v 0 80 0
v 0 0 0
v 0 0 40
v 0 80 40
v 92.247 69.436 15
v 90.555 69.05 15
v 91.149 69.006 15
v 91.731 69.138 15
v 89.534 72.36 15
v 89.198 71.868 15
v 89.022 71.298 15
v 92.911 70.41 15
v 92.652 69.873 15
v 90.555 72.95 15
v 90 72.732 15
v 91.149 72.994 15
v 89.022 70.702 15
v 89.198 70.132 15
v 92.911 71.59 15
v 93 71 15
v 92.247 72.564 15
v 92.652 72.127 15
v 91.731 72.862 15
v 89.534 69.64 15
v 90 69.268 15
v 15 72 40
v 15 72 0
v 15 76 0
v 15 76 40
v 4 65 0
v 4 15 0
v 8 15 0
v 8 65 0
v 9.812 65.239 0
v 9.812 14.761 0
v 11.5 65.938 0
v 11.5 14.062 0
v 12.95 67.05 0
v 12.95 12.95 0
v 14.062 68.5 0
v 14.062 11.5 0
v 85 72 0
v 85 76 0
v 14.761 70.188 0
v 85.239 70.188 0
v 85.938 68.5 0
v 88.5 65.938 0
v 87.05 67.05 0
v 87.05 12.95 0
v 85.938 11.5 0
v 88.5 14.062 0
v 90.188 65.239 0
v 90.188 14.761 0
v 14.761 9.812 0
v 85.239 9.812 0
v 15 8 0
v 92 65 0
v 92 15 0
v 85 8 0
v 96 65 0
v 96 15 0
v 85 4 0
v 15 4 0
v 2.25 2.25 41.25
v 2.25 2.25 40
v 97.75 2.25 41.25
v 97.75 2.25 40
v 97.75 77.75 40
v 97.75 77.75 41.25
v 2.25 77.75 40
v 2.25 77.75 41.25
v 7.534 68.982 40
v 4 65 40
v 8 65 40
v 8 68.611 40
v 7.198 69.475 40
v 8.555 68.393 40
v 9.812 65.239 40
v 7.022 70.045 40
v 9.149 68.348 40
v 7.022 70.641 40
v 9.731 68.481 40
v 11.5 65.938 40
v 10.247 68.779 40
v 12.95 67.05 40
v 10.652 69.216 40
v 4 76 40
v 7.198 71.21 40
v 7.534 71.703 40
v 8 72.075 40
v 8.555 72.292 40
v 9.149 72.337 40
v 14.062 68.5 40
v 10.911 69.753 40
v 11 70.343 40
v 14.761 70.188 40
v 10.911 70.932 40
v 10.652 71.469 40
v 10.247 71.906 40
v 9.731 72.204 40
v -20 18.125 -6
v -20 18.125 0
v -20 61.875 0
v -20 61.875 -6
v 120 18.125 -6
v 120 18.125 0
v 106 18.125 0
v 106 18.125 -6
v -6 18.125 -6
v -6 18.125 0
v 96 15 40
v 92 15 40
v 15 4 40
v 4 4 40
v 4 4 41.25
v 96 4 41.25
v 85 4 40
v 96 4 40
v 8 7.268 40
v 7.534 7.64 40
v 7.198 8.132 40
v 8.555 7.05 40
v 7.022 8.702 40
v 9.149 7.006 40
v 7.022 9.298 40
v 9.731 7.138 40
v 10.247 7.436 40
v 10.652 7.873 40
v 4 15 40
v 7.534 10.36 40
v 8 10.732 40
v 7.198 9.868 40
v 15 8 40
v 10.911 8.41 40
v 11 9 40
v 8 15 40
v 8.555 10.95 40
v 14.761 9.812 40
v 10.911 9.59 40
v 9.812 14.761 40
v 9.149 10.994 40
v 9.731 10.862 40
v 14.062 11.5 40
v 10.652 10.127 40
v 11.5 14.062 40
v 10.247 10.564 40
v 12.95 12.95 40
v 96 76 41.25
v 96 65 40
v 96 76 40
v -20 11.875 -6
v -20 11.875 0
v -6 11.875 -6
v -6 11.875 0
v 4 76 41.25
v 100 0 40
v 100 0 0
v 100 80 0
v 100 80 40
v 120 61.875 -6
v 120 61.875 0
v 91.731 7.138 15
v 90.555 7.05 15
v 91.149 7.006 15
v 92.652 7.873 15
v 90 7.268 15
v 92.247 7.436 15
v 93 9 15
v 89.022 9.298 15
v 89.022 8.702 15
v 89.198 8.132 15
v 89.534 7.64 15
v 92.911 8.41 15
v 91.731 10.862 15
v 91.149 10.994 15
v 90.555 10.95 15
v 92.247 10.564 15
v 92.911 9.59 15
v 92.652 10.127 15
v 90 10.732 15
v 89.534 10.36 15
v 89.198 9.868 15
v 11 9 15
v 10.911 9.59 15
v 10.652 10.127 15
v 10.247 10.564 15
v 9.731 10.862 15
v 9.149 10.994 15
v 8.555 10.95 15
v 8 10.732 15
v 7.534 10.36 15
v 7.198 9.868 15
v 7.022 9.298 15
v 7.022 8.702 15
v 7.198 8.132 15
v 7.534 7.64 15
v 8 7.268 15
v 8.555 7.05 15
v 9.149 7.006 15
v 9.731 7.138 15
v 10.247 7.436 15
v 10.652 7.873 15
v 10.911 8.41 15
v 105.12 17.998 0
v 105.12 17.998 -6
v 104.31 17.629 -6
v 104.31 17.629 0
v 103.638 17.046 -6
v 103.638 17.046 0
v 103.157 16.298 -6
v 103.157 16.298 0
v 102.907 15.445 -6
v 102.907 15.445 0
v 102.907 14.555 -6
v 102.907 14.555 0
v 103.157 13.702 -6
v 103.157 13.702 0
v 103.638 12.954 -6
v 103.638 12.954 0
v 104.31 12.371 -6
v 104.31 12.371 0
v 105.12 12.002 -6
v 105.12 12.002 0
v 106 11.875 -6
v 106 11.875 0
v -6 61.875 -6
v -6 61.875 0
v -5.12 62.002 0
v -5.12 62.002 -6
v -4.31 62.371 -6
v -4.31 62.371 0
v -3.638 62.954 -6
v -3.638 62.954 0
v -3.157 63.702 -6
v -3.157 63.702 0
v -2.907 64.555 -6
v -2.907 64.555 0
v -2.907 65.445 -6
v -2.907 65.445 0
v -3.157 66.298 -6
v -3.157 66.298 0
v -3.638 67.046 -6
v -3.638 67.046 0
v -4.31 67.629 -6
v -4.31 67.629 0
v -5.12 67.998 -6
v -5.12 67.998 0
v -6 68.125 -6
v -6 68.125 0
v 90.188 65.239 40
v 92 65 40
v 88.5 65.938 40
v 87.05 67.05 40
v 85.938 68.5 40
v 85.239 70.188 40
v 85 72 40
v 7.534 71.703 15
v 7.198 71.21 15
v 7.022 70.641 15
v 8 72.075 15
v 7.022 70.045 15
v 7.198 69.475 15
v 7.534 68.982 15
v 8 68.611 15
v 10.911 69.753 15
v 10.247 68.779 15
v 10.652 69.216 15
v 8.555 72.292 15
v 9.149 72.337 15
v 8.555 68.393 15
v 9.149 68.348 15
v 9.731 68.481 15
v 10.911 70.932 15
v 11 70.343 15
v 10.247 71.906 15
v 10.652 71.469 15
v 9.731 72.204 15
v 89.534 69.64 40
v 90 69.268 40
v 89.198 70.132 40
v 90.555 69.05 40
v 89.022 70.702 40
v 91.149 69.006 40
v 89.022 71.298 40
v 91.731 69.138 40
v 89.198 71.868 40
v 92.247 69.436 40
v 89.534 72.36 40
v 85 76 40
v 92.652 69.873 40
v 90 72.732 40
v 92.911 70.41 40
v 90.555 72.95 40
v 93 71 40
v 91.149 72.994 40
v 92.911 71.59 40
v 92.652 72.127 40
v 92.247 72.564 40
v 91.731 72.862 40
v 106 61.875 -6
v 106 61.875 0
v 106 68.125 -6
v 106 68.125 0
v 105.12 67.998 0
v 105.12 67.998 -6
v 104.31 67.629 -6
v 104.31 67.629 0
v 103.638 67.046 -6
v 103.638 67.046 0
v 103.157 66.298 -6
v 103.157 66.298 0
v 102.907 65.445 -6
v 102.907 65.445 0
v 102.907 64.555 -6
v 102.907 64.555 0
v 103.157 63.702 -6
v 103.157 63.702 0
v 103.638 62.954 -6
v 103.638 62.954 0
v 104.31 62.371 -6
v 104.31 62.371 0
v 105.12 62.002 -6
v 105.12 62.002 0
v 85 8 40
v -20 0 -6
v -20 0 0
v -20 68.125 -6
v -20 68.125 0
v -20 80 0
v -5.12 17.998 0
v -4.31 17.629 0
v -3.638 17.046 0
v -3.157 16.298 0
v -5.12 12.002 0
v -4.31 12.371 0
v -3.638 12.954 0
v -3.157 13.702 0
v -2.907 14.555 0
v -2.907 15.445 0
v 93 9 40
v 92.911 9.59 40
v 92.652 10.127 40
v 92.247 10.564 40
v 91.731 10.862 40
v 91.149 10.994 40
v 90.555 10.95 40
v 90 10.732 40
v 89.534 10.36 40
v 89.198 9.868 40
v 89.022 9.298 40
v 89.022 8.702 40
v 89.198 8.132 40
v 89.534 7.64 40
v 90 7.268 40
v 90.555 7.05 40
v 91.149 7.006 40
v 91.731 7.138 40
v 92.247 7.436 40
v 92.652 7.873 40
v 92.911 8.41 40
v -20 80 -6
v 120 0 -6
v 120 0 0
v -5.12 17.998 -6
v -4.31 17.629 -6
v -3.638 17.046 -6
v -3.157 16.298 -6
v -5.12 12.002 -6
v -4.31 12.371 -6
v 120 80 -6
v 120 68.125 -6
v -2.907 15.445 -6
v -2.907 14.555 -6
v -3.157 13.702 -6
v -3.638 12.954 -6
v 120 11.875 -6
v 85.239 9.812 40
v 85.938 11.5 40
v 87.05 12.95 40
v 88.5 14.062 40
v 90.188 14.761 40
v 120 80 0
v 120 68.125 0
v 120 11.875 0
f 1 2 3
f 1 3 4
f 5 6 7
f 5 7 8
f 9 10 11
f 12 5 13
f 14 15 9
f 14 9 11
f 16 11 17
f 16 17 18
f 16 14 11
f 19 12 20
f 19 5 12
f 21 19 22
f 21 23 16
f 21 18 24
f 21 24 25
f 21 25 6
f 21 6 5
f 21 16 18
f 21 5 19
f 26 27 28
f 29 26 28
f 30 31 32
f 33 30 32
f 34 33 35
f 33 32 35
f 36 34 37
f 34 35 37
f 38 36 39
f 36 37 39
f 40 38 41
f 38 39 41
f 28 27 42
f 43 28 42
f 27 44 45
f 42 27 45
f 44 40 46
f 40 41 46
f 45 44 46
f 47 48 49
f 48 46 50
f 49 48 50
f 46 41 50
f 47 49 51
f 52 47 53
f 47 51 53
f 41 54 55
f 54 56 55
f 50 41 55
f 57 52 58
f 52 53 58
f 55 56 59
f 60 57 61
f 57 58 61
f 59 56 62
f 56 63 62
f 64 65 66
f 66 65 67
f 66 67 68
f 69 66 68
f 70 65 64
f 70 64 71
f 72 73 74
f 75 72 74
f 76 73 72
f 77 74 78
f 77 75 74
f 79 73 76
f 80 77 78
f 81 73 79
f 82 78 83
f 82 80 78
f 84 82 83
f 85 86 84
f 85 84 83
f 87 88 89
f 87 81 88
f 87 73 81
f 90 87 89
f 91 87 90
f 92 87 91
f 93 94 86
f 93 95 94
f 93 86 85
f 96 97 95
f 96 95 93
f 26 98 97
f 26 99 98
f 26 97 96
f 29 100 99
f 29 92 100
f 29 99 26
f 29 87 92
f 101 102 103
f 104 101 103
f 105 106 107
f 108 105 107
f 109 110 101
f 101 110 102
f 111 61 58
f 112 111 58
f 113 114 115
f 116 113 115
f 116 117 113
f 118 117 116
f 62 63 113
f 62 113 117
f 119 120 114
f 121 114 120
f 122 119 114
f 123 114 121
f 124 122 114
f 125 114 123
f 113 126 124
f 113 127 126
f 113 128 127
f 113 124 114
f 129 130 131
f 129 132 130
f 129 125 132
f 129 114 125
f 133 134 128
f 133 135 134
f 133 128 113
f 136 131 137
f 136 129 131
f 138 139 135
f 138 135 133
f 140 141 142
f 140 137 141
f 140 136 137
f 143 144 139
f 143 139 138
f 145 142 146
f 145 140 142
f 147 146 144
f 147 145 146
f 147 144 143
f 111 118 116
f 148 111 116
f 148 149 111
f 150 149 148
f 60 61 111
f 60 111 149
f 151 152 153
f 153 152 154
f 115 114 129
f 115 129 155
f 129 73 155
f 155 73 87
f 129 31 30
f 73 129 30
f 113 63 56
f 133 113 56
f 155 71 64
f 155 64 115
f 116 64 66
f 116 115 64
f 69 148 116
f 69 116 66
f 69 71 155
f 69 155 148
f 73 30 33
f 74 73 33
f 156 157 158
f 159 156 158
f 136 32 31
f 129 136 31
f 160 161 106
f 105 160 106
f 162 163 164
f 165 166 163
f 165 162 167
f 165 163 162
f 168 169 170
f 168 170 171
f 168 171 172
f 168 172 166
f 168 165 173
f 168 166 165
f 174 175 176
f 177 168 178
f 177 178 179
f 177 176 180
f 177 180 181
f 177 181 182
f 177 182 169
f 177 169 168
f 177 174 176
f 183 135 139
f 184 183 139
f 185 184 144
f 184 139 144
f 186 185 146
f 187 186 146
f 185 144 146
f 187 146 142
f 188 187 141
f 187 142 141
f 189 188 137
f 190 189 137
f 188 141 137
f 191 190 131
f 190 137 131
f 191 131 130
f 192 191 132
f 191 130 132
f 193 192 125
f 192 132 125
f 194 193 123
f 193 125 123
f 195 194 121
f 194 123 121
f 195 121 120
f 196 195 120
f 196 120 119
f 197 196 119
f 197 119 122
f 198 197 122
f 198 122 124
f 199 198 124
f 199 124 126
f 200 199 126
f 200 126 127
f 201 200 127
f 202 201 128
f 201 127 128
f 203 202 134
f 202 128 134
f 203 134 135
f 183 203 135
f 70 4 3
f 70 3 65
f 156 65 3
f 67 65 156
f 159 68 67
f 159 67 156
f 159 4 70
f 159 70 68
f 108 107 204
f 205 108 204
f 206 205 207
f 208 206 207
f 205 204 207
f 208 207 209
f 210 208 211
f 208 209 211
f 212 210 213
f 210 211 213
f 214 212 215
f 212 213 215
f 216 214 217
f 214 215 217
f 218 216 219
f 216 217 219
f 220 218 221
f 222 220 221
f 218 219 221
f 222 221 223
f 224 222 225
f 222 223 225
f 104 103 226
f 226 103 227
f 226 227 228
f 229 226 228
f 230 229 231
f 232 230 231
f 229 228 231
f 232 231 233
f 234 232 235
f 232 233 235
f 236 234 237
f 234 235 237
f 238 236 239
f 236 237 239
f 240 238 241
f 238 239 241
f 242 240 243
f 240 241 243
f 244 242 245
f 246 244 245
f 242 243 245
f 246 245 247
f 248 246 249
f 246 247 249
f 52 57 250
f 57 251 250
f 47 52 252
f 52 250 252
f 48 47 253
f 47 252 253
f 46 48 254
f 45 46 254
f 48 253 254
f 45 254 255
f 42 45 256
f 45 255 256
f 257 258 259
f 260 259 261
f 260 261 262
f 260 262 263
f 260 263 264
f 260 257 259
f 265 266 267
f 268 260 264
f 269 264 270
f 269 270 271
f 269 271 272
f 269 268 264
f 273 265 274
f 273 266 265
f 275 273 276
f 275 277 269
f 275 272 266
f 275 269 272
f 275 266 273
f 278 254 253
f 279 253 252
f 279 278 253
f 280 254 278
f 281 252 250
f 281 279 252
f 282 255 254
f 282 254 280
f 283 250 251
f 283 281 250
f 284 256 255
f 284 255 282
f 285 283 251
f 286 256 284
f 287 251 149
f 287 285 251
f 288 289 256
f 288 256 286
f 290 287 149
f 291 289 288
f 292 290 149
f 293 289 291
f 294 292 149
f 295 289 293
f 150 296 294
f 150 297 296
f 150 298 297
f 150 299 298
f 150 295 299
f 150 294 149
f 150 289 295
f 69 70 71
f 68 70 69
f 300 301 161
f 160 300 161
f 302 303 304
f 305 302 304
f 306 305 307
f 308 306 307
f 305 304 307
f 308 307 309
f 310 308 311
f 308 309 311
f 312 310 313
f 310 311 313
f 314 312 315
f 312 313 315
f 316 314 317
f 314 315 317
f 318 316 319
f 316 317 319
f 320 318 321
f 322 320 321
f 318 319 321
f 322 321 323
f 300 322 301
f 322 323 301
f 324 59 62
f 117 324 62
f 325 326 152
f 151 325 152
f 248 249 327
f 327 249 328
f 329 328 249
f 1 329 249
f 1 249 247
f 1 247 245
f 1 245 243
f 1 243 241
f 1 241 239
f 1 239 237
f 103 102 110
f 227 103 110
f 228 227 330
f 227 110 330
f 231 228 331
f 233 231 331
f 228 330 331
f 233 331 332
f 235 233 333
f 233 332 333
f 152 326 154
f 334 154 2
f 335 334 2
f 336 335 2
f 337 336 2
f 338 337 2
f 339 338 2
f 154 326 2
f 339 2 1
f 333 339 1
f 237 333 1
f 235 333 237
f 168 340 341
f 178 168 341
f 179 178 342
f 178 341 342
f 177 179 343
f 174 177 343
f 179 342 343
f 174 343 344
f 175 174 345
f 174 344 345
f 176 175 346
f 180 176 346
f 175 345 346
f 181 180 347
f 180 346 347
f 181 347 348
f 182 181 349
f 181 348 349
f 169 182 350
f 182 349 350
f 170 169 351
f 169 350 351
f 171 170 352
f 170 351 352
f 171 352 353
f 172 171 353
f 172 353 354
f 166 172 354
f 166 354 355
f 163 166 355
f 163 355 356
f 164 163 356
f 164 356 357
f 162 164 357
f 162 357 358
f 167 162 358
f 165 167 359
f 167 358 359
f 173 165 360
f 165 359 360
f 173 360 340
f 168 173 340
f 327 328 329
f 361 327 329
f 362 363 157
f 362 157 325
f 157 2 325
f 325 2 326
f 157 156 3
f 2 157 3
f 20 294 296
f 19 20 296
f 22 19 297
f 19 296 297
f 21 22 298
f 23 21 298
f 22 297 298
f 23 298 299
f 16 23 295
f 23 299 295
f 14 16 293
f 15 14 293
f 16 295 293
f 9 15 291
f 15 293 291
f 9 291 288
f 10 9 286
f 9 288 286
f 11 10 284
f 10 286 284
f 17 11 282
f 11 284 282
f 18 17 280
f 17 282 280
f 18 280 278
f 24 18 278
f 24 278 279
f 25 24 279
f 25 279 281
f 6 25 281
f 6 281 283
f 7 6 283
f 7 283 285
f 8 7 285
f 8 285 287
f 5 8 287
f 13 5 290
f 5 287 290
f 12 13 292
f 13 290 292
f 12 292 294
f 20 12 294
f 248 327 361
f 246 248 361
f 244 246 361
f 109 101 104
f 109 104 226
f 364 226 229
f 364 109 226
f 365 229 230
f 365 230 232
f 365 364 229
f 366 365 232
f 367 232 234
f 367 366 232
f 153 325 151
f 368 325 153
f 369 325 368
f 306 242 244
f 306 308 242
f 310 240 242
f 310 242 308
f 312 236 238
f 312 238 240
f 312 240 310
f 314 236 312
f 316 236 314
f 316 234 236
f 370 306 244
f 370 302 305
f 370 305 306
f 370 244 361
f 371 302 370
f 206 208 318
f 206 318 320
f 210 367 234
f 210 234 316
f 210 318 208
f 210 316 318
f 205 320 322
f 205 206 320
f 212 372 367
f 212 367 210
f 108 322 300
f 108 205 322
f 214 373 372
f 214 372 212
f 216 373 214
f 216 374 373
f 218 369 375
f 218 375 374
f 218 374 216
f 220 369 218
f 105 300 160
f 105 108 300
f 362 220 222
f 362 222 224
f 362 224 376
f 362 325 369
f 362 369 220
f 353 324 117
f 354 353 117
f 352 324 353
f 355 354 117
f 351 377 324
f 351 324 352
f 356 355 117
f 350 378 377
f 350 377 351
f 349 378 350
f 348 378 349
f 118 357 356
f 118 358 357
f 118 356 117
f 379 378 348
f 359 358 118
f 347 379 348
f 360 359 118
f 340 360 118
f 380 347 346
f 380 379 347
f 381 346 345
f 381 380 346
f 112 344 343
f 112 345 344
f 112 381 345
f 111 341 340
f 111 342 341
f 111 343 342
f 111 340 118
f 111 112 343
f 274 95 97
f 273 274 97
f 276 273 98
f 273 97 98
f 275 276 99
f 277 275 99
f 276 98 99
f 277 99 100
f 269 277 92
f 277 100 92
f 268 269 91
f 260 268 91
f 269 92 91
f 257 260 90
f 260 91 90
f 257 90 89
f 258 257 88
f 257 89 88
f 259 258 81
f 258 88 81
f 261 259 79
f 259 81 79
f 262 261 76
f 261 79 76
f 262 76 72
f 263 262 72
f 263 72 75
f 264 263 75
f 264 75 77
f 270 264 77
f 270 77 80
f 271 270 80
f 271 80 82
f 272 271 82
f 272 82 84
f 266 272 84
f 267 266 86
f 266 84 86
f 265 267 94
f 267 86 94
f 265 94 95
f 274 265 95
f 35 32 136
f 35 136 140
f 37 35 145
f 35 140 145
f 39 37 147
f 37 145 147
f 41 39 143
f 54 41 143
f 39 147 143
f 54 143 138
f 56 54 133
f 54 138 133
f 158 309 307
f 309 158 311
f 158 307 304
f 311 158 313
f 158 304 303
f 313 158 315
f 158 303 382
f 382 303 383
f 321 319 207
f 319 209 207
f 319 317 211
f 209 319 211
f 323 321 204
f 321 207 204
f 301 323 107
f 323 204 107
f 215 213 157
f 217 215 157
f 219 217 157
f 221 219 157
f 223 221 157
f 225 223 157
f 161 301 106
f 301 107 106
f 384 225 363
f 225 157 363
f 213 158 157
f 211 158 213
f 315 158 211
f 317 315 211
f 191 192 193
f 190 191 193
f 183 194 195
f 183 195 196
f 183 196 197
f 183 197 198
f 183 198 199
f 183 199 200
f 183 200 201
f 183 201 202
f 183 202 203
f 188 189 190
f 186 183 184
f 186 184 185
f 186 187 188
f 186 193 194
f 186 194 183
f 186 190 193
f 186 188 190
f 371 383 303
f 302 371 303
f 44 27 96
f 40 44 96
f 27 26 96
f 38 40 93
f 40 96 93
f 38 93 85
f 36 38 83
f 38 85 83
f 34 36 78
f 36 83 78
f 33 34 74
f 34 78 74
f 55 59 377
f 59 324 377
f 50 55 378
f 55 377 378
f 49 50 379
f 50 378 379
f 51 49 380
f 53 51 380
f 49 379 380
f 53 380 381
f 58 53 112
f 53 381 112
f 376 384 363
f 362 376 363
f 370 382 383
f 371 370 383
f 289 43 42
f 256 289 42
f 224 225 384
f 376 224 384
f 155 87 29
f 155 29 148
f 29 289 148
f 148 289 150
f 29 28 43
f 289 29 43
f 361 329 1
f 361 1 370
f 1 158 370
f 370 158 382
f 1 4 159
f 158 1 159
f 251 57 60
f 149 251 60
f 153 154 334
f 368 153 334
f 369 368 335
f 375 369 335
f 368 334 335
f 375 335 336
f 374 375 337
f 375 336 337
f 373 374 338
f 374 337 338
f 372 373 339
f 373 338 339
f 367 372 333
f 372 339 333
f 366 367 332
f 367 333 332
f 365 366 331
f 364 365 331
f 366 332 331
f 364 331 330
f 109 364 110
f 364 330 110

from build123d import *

# Parameters (mm, degrees)
F0_W     = 100
F0_H     = 80
F1_DEPTH = 40
F3_DEPTH = 6
F4_R     = 7
F5_W     = 95.5
F5_H     = 75.5
F5_W_2   = 92
F5_H_2   = 72
F6_DEPTH = 1.25
F7_R     = 2
F8_DEPTH = 25


with BuildPart() as f1:
    # F0 (on Top) → F1 (new body)
    with BuildSketch(Plane.XY):
        with Locations((50, 40)):
            Rectangle(F0_W, F0_H)
        Polygon((85, 4), (15, 4), (15, 15), (4, 15), (4, 65), (15, 65), (15, 76), (85, 76), (85, 65), (96, 65), (96, 15), (85, 15), align=None, mode=Mode.SUBTRACT)
    extrude(amount=F1_DEPTH)

    # F2 (on face) → F3 (join)
    with BuildSketch(Plane(origin=(0, 0, 0), x_dir=(1, 0, 0), z_dir=(0, 0, -1))):
        with BuildLine():
            Line((120, 0), (-20, 0))
            Line((-20, 0), (-20, -11.875))
            Line((-20, -11.875), (-6, -11.875))
            ThreePointArc((-6, -11.875), (-2.875, -15), (-6, -18.125))
            Line((-6, -18.125), (-20, -18.125))
            Line((-20, -18.125), (-20, -61.875))
            Line((-20, -61.875), (-6, -61.875))
            ThreePointArc((-6, -61.875), (-2.875, -65), (-6, -68.125))
            Line((-6, -68.125), (-20, -68.125))
            Line((-20, -68.125), (-20, -80))
            Line((-20, -80), (120, -80))
            Line((120, -80), (120, -68.125))
            Line((120, -68.125), (106, -68.125))
            ThreePointArc((106, -68.125), (102.875, -65), (106, -61.875))
            Line((106, -61.875), (120, -61.875))
            Line((120, -61.875), (120, -18.125))
            Line((120, -18.125), (106, -18.125))
            ThreePointArc((106, -18.125), (102.875, -15), (106, -11.875))
            Line((106, -11.875), (120, -11.875))
            Line((120, -11.875), (120, 0))
        make_face()
    extrude(amount=F3_DEPTH)

    # F4
    f4_edges = [f1.edges().sort_by_distance(p)[0] for p in [
        (15, 65, 20),
        (15, 15, 20),
        (85, 65, 20),
        (85, 15, 20),
    ]]
    fillet(f4_edges, radius=F4_R)

    # F5 (on face) → F6 (join)
    with BuildSketch(Plane.XY.offset(40)):
        with Locations((50, 40)):
            Rectangle(F5_W, F5_H)
        with Locations((50, 40)):
            Rectangle(F5_W_2, F5_H_2, mode=Mode.SUBTRACT)
    extrude(amount=F6_DEPTH)

    # F7 (on face) → F8 (cut)
    with BuildSketch(Plane.XY.offset(40)):
        with Locations((9, 9)):
            Circle(F7_R)
        with Locations((9, 70.342632)):
            Circle(F7_R)
        with Locations((91, 71)):
            Circle(F7_R)
        with Locations((91, 9)):
            Circle(F7_R)
    extrude(amount=-F8_DEPTH, mode=Mode.SUBTRACT)


solid = f1.part
